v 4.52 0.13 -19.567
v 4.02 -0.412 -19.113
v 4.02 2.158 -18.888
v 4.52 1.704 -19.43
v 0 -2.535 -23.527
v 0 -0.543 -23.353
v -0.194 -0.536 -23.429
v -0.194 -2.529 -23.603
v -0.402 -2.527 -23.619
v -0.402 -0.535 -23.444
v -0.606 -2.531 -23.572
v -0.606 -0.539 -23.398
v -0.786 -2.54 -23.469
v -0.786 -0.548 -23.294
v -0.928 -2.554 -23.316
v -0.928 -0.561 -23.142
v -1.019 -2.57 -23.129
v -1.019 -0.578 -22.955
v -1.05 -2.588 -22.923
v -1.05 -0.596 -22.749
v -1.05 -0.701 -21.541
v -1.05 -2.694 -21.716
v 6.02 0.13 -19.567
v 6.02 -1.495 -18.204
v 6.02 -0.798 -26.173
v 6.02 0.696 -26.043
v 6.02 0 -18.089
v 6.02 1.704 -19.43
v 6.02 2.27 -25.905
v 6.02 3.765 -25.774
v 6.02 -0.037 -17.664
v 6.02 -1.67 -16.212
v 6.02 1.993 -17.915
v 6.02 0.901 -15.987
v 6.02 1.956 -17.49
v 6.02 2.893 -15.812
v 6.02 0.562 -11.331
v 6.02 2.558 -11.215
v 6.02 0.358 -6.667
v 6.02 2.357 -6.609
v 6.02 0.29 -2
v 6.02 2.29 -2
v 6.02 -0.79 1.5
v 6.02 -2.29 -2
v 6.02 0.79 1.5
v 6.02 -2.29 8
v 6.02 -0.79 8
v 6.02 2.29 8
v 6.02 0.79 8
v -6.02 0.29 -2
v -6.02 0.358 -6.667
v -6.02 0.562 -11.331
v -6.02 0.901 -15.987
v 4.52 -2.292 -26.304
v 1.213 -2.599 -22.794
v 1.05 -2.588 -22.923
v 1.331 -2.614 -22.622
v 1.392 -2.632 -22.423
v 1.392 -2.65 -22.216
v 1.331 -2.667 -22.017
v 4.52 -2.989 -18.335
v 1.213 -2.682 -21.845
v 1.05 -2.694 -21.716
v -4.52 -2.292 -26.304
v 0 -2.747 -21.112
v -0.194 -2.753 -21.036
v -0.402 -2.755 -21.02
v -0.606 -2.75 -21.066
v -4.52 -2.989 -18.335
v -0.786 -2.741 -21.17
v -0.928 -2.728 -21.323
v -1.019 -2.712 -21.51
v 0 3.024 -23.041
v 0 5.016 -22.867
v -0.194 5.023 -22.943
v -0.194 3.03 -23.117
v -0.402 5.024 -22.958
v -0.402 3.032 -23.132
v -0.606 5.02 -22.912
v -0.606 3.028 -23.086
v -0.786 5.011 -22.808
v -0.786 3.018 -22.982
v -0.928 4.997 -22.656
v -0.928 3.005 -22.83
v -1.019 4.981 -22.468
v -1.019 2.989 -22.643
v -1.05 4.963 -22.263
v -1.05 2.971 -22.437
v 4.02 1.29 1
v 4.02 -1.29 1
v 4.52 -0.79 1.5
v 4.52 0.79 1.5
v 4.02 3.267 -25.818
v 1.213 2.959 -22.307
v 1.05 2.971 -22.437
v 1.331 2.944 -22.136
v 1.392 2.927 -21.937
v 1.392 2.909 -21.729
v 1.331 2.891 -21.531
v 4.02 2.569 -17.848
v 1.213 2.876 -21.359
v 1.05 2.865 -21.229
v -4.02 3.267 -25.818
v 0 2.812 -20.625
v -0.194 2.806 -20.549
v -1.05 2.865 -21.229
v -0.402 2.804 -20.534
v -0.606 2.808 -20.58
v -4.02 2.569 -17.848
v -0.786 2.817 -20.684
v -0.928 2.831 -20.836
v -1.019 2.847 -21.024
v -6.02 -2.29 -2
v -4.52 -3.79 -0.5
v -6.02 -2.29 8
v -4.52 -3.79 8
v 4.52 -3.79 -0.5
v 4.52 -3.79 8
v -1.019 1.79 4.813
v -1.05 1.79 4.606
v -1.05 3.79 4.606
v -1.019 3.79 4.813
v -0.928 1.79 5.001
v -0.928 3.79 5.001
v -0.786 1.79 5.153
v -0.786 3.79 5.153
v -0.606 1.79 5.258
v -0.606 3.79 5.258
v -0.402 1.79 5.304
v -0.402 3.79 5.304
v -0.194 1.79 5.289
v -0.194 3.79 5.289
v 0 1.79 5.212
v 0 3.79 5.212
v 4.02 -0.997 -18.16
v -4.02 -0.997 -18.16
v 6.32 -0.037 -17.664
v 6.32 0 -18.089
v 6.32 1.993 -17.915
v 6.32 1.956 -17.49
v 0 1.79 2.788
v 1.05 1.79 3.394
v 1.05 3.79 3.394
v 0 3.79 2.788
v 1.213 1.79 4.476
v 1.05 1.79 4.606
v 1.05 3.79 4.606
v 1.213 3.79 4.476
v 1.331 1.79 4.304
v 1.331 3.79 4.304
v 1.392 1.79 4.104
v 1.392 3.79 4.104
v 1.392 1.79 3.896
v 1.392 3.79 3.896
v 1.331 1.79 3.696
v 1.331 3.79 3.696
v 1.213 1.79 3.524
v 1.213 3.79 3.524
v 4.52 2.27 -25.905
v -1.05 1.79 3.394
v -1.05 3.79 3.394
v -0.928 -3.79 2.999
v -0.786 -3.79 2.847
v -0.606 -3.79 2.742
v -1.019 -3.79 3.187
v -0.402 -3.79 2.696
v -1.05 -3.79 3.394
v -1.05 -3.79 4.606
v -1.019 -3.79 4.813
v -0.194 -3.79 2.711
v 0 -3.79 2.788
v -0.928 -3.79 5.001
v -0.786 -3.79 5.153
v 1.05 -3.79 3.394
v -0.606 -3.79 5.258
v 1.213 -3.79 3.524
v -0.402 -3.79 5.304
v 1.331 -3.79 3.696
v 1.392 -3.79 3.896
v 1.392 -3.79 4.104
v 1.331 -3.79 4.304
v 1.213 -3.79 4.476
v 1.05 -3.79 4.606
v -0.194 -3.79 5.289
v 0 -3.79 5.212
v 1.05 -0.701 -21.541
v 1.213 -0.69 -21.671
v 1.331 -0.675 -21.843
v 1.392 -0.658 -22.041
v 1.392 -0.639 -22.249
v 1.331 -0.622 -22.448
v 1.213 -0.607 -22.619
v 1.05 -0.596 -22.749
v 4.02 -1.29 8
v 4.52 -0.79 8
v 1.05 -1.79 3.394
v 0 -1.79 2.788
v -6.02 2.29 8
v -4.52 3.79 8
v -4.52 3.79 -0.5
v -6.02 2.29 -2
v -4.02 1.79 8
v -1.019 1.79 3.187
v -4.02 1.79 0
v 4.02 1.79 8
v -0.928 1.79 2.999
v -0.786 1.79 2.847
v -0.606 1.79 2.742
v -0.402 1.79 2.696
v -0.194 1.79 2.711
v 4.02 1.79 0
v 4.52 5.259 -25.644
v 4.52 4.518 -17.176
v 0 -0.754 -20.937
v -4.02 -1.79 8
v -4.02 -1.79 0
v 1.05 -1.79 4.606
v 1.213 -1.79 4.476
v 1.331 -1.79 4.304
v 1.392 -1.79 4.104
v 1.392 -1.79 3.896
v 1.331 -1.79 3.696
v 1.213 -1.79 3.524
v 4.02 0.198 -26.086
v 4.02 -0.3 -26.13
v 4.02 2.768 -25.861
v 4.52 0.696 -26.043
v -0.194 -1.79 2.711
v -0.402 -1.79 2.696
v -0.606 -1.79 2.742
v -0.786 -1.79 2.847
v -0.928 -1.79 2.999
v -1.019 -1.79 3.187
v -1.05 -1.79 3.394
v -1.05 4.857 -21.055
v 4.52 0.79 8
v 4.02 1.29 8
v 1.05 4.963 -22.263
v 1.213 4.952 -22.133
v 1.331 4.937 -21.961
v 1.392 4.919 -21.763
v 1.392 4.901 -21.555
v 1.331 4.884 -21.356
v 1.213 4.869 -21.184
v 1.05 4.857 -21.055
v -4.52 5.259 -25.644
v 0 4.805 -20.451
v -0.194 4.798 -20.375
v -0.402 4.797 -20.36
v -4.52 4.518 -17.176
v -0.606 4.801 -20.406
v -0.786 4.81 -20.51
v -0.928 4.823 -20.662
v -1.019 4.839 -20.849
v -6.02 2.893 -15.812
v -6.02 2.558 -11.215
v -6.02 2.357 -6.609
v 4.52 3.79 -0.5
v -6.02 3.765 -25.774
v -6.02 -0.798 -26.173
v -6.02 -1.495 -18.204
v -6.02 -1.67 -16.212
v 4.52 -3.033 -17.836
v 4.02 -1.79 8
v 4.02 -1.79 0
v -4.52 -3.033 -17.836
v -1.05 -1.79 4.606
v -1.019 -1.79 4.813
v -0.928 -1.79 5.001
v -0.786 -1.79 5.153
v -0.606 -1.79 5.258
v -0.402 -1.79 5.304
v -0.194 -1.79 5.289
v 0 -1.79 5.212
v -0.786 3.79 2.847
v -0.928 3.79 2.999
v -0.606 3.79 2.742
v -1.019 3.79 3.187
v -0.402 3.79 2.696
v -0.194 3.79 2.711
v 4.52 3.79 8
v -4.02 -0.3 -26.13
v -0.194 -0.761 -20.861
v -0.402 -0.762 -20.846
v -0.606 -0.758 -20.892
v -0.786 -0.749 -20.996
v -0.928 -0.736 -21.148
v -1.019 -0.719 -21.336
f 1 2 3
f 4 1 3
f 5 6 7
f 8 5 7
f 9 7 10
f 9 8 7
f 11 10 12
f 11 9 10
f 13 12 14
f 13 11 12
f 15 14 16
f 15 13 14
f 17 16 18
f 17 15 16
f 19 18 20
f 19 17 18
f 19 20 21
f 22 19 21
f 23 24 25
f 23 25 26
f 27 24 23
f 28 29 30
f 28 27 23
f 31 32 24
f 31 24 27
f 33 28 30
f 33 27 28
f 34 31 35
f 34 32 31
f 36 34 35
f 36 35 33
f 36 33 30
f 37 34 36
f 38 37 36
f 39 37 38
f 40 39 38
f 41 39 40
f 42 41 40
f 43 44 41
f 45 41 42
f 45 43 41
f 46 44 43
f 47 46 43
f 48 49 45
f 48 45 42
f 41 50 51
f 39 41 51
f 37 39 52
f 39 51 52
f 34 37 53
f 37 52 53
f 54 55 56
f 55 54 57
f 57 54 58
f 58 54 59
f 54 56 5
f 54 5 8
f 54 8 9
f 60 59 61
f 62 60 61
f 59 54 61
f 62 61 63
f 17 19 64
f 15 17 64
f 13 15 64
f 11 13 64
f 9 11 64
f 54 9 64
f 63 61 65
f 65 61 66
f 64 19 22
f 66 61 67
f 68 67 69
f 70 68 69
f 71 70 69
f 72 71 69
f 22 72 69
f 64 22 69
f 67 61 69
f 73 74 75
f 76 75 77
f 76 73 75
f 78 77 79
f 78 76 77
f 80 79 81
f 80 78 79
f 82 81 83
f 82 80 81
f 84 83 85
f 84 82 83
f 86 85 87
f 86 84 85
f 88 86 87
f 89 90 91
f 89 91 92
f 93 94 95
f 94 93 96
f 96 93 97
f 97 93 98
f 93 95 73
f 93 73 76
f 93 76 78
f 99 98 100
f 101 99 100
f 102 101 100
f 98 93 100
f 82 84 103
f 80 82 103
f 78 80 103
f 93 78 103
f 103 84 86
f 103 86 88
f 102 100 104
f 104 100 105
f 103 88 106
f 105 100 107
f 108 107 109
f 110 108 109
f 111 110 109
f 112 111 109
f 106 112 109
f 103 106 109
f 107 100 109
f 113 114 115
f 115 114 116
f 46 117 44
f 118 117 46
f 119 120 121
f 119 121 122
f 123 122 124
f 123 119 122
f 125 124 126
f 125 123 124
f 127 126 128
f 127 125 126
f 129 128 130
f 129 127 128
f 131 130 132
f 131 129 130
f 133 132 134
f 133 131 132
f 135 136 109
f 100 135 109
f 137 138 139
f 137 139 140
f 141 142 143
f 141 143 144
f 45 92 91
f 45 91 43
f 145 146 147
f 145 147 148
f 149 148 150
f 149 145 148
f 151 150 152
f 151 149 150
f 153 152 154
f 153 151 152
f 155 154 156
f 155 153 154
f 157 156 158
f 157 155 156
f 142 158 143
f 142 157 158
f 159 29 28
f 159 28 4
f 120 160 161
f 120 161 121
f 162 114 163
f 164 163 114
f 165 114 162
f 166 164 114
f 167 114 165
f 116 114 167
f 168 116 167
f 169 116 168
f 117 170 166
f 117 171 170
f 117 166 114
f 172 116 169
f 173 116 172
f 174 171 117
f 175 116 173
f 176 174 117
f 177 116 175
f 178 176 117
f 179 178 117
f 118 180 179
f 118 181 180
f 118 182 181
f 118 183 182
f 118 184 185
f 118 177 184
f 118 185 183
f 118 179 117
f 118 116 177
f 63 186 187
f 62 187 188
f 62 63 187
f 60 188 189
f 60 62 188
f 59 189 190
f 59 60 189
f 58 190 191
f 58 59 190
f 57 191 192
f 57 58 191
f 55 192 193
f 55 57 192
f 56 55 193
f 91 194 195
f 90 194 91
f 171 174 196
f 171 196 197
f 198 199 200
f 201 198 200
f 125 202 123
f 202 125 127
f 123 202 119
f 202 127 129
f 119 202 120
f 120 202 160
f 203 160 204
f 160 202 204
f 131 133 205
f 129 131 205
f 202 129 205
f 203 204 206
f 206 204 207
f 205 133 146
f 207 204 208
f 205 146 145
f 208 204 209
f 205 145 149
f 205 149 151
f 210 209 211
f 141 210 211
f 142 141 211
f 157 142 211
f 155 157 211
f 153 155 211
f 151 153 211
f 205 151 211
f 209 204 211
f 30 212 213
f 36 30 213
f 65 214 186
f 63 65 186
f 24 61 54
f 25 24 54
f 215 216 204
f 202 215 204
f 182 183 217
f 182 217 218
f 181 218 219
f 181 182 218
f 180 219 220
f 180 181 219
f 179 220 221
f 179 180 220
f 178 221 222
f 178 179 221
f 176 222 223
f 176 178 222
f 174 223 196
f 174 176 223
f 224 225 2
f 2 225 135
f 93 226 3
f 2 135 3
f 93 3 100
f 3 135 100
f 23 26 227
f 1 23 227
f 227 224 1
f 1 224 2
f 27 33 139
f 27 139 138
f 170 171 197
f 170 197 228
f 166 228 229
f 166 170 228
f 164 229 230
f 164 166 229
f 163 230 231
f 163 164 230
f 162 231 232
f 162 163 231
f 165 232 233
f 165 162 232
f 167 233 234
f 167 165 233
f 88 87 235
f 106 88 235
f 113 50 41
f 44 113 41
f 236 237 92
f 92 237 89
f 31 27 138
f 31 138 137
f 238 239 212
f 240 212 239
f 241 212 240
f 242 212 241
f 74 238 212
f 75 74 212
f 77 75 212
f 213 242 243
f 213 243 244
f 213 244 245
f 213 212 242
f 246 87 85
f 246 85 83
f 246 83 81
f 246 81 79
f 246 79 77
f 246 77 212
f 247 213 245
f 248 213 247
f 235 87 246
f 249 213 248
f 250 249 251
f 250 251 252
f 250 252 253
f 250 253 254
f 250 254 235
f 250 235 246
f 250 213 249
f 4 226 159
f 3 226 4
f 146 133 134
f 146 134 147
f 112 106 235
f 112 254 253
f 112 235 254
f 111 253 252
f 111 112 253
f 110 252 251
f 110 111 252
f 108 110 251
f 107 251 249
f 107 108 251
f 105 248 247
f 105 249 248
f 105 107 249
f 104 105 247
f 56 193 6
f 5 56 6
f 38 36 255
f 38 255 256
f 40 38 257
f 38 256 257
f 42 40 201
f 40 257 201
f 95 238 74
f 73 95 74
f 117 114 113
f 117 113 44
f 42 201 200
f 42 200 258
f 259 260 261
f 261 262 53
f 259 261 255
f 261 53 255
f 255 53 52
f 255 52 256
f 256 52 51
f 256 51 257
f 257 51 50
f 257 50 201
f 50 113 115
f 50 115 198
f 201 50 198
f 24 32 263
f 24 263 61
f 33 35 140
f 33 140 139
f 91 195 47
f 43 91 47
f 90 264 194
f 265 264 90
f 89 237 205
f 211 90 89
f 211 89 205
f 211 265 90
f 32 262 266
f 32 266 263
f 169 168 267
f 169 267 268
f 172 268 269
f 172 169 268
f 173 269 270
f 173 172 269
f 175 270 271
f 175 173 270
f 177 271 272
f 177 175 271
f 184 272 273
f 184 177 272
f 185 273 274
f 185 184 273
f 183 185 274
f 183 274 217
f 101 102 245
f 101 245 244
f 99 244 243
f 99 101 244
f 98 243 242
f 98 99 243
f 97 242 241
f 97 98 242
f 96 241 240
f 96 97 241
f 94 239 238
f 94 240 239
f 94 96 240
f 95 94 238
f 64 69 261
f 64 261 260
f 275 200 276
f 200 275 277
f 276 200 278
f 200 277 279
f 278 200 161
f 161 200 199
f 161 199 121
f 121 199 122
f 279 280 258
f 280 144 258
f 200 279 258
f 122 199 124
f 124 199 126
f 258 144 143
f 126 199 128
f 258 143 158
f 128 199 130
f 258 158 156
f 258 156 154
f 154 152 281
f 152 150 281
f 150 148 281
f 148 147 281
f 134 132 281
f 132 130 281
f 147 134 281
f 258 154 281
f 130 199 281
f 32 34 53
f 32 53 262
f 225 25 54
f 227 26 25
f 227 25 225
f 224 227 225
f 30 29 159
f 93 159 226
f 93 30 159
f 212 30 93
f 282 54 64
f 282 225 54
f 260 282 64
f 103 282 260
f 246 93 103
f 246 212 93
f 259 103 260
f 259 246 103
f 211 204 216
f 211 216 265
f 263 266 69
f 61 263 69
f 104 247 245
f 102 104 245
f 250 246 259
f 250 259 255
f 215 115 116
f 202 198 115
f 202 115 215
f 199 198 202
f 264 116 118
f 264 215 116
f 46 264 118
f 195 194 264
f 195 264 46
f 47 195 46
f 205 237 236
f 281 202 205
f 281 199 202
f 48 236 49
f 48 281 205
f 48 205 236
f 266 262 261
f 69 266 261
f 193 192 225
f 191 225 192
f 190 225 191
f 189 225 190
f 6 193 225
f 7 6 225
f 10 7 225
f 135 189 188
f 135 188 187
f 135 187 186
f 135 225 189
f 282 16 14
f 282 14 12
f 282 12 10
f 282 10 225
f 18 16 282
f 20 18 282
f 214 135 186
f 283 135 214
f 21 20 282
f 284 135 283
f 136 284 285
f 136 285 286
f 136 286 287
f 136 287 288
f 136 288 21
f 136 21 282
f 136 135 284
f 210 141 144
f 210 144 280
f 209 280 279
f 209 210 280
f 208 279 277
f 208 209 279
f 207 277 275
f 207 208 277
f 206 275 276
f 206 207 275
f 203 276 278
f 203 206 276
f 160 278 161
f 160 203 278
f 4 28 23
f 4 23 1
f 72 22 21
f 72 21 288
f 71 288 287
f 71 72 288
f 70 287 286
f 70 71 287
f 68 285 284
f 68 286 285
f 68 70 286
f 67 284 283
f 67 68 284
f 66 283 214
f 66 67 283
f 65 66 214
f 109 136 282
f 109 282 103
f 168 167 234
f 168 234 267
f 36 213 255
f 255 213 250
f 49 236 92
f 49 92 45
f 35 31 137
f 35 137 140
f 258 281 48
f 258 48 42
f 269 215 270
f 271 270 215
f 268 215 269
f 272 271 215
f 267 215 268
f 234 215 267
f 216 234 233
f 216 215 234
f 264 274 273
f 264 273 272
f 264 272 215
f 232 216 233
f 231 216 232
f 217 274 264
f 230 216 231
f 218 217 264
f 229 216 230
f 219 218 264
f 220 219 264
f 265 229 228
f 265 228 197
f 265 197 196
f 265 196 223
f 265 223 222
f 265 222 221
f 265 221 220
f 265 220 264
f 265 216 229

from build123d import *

# Parameters (mm, degrees)
SKETCH1_W               = 12.04
SKETCH1_H               = 7.58
SKETCH1_W_2             = 8.04
SKETCH1_H_2             = 3.58
BOSS_EXTRUDE1_DEPTH     = 8
SKETCH1_2_W             = 12.04
SKETCH1_2_H             = 7.58
SKETCH1_2_W_2           = 8.04
SKETCH1_2_H_2           = 3.58
BOSS_EXTRUDE2_DEPTH     = 2
EXTRUDE_THIN1_START     = -12.04
EXTRUDE_THIN1_DEPTH     = 12.04
SKETCH5_W               = 12.04
SKETCH5_H               = 7.58
SKETCH5_W_2             = 8.04
SKETCH5_H_2             = 3.58
BOSS_EXTRUDE4_DEPTH     = 10
SKETCH5_4_W             = 12.04
SKETCH5_4_H             = 7.58
BOSS_EXTRUDE5_DEPTH     = 2
CHAMFER1_SIZE           = 1.5
CUT_EXTRUDE1_DEPTH      = 29.028711337
CUT_EXTRUDE1_DEPTH_BACK = 29.028711337
CUT_EXTRUDE2_DEPTH      = 29.071269996
CUT_EXTRUDE2_DEPTH_BACK = 29.071269996
SKETCH8_W               = 4
SKETCH8_H               = 1.58
CUT_EXTRUDE3_DEPTH      = 6.5
SKETCH9_W               = 4
SKETCH9_H               = 1.58
CUT_EXTRUDE4_DEPTH      = 6.5
CHAMFER2_SIZE           = 0.5
BOSS_EXTRUDE8_DEPTH     = 0.3


with BuildPart() as part:
    # Sketch1 → Boss-Extrude1 (new body)
    with BuildSketch(Plane.XY):
        Rectangle(SKETCH1_W, SKETCH1_H)
        Rectangle(SKETCH1_W_2, SKETCH1_H_2, mode=Mode.SUBTRACT)
    extrude(amount=BOSS_EXTRUDE1_DEPTH)

    # Sketch1<2> → Boss-Extrude2 (add)
    # profile 1 of 2: a face of its own
    with BuildSketch(Plane.XY):
        Rectangle(SKETCH1_2_W, SKETCH1_2_H)
        Rectangle(SKETCH1_2_W_2, SKETCH1_2_H_2, mode=Mode.SUBTRACT)
    # profile 2 of 2: a face of its own
    with BuildSketch(Plane.XY):
        Rectangle(SKETCH1_2_W_2, SKETCH1_2_H_2)
    extrude(amount=-BOSS_EXTRUDE2_DEPTH)

    # Sketch3 → Extrude-Thin1 (add)
    with BuildSketch(Plane(origin=(6.02, 9.81, 0), x_dir=(0, -1, 0), z_dir=(1, 0, 0)).offset(EXTRUDE_THIN1_START)):
        with BuildLine():
            Line((13.6, 2), (9.52, 2))
            ThreePointArc((9.52, 2), (9.367259482, 9), (8.909328677, 15.986675107))
            Line((8.909328677, 15.986675107), (12.973803045, 16.342270537))
            Line((12.973803045, 16.342270537), (12.799491559, 18.334659933))
            Line((12.799491559, 18.334659933), (6.730055387, 17.803653074))
            ThreePointArc((6.730055387, 17.803653074), (7.369163038, 8.912761225), (7.507379539, 0))
            Line((7.507379539, 0), (13.6, 0))
            Line((13.6, 0), (13.6, 2))
        make_face()
    extrude(amount=EXTRUDE_THIN1_DEPTH)

    # Sketch5 → Boss-Extrude4 (add)
    with BuildSketch(Plane(origin=(0, -2.356055999, -16.271601827), x_dir=(-1, 0, 0), z_dir=(0, 0.08715574274765182, -0.9961946980917462))):
        with Locations((0, 2.979167492)):
            Rectangle(SKETCH5_W, SKETCH5_H)
        with Locations((0, 2.979167492)):
            Rectangle(SKETCH5_W_2, SKETCH5_H_2, mode=Mode.SUBTRACT)
    extrude(amount=BOSS_EXTRUDE4_DEPTH)

    # Sketch5<4> → Boss-Extrude5 (add)
    with BuildSketch(Plane(origin=(0, -2.356055999, -16.271601827), x_dir=(-1, 0, 0), z_dir=(0, 0.08715574274765182, -0.9961946980917462))):
        with Locations((0, 2.979167492)):
            Rectangle(SKETCH5_4_W, SKETCH5_4_H)
    extrude(amount=BOSS_EXTRUDE5_DEPTH)

    # Chamfer1
    chamfer1_edges = [part.edges().sort_by_distance(p)[0] for p in [
        (0, -3.79, -2),
        (0, 3.79, -2),
        (-6.02, -2.728024331, -21.323244027),
        (6.02, -2.728024331, -21.323244027),
        (0, -3.163803045, -16.342270537),
        (6.02, -3.79, 3),
        (-6.02, -3.79, 3),
        (-6.02, 3.79, 3),
        (6.02, 3.79, 3),
        (0, 4.387352767, -15.681630007),
        (6.02, 4.82313148, -20.662603497),
        (-6.02, 4.82313148, -20.662603497),
    ]]
    chamfer(chamfer1_edges, length=CHAMFER1_SIZE - 0.0001)  # a hair under: the kernel refuses the full size

    # Sketch6 → Cut-Extrude1 (cut, two sides: drawn at the far end of the back side and taken through both)
    with BuildSketch(Plane(origin=(0, 3.79, 0), x_dir=(1, 0, 0), z_dir=(0, 1, 0)).offset(-CUT_EXTRUDE1_DEPTH_BACK)):
        with BuildLine():
            Line((1.05, -3.393782217), (0, -2.787564435))
            ThreePointArc((0, -2.787564435), (-0.7, -2.787564435), (-1.05, -3.393782217))
            Line((-1.05, -3.393782217), (-1.05, -4.606217783))
            ThreePointArc((-1.05, -4.606217783), (-0.7, -5.212435565), (0, -5.212435565))
            Line((0, -5.212435565), (1.05, -4.606217783))
            ThreePointArc((1.05, -4.606217783), (1.4, -4), (1.05, -3.393782217))
        make_face()
    extrude(amount=CUT_EXTRUDE1_DEPTH + CUT_EXTRUDE1_DEPTH_BACK, mode=Mode.SUBTRACT)

    # Sketch7 → Cut-Extrude2 (cut, two sides: drawn at the far end of the back side and taken through both)
    with BuildSketch(Plane(origin=(0, 2.992482656, 0.261808308), x_dir=(1, 0, 0), z_dir=(0, 0.9961946980917462, 0.08715574274765181)).offset(-CUT_EXTRUDE2_DEPTH_BACK)):
        with BuildLine():
            Line((1.05, 22.610557442), (0, 23.216775225))
            ThreePointArc((0, 23.216775225), (-0.7, 23.216775225), (-1.05, 22.610557442))
            Line((-1.05, 22.610557442), (-1.05, 21.398121877))
            ThreePointArc((-1.05, 21.398121877), (-0.7, 20.791904094), (0, 20.791904094))
            Line((0, 20.791904094), (1.05, 21.398121877))
            ThreePointArc((1.05, 21.398121877), (1.4, 22.004339659), (1.05, 22.610557442))
        make_face()
    extrude(amount=CUT_EXTRUDE2_DEPTH + CUT_EXTRUDE2_DEPTH_BACK, mode=Mode.SUBTRACT)

    # Sketch8 → Cut-Extrude3 (cut)
    with BuildSketch(Plane(origin=(0, 2.266427538, -25.905385296), x_dir=(-1, 0, 0), z_dir=(0, 0.08715574274765193, -0.9961946980917461))):
        with Locations((-6.02, -0.786086546)):
            Rectangle(SKETCH8_W, SKETCH8_H)
    extrude(amount=-CUT_EXTRUDE3_DEPTH, mode=Mode.SUBTRACT)

    # Sketch9 → Cut-Extrude4 (cut)
    with BuildSketch(Plane.XY.offset(8)):
        with Locations((6.02, 0)):
            Rectangle(SKETCH9_W, SKETCH9_H)
    extrude(amount=-CUT_EXTRUDE4_DEPTH, mode=Mode.SUBTRACT)

    # Chamfer2
    chamfer2_edges = [part.edges().sort_by_distance(p)[0] for p in [
        (4.02, 0.413082313, -22.805117521),
        (4.02, 0.91681996, -19.498631715),
        (4.02, 1.987069936, -22.667411447),
        (4.02, 0.79, 4.75),
        (4.02, 0, 1.5),
        (4.02, -0.79, 4.75),
    ]]
    chamfer(chamfer2_edges, length=CHAMFER2_SIZE)

    # Sketch12 → Boss-Extrude8 (add)
    with BuildSketch(Plane(origin=(6.02, 0, 0), x_dir=(0, 0, -1), z_dir=(1, 0, 0))):
        Polygon((17.914805855, 1.992834285), (18.088967441, 0.000456236), (17.664424758, -0.036510227), (17.490263173, 1.955867821), align=None)
    extrude(amount=BOSS_EXTRUDE8_DEPTH)


solid = part.part
